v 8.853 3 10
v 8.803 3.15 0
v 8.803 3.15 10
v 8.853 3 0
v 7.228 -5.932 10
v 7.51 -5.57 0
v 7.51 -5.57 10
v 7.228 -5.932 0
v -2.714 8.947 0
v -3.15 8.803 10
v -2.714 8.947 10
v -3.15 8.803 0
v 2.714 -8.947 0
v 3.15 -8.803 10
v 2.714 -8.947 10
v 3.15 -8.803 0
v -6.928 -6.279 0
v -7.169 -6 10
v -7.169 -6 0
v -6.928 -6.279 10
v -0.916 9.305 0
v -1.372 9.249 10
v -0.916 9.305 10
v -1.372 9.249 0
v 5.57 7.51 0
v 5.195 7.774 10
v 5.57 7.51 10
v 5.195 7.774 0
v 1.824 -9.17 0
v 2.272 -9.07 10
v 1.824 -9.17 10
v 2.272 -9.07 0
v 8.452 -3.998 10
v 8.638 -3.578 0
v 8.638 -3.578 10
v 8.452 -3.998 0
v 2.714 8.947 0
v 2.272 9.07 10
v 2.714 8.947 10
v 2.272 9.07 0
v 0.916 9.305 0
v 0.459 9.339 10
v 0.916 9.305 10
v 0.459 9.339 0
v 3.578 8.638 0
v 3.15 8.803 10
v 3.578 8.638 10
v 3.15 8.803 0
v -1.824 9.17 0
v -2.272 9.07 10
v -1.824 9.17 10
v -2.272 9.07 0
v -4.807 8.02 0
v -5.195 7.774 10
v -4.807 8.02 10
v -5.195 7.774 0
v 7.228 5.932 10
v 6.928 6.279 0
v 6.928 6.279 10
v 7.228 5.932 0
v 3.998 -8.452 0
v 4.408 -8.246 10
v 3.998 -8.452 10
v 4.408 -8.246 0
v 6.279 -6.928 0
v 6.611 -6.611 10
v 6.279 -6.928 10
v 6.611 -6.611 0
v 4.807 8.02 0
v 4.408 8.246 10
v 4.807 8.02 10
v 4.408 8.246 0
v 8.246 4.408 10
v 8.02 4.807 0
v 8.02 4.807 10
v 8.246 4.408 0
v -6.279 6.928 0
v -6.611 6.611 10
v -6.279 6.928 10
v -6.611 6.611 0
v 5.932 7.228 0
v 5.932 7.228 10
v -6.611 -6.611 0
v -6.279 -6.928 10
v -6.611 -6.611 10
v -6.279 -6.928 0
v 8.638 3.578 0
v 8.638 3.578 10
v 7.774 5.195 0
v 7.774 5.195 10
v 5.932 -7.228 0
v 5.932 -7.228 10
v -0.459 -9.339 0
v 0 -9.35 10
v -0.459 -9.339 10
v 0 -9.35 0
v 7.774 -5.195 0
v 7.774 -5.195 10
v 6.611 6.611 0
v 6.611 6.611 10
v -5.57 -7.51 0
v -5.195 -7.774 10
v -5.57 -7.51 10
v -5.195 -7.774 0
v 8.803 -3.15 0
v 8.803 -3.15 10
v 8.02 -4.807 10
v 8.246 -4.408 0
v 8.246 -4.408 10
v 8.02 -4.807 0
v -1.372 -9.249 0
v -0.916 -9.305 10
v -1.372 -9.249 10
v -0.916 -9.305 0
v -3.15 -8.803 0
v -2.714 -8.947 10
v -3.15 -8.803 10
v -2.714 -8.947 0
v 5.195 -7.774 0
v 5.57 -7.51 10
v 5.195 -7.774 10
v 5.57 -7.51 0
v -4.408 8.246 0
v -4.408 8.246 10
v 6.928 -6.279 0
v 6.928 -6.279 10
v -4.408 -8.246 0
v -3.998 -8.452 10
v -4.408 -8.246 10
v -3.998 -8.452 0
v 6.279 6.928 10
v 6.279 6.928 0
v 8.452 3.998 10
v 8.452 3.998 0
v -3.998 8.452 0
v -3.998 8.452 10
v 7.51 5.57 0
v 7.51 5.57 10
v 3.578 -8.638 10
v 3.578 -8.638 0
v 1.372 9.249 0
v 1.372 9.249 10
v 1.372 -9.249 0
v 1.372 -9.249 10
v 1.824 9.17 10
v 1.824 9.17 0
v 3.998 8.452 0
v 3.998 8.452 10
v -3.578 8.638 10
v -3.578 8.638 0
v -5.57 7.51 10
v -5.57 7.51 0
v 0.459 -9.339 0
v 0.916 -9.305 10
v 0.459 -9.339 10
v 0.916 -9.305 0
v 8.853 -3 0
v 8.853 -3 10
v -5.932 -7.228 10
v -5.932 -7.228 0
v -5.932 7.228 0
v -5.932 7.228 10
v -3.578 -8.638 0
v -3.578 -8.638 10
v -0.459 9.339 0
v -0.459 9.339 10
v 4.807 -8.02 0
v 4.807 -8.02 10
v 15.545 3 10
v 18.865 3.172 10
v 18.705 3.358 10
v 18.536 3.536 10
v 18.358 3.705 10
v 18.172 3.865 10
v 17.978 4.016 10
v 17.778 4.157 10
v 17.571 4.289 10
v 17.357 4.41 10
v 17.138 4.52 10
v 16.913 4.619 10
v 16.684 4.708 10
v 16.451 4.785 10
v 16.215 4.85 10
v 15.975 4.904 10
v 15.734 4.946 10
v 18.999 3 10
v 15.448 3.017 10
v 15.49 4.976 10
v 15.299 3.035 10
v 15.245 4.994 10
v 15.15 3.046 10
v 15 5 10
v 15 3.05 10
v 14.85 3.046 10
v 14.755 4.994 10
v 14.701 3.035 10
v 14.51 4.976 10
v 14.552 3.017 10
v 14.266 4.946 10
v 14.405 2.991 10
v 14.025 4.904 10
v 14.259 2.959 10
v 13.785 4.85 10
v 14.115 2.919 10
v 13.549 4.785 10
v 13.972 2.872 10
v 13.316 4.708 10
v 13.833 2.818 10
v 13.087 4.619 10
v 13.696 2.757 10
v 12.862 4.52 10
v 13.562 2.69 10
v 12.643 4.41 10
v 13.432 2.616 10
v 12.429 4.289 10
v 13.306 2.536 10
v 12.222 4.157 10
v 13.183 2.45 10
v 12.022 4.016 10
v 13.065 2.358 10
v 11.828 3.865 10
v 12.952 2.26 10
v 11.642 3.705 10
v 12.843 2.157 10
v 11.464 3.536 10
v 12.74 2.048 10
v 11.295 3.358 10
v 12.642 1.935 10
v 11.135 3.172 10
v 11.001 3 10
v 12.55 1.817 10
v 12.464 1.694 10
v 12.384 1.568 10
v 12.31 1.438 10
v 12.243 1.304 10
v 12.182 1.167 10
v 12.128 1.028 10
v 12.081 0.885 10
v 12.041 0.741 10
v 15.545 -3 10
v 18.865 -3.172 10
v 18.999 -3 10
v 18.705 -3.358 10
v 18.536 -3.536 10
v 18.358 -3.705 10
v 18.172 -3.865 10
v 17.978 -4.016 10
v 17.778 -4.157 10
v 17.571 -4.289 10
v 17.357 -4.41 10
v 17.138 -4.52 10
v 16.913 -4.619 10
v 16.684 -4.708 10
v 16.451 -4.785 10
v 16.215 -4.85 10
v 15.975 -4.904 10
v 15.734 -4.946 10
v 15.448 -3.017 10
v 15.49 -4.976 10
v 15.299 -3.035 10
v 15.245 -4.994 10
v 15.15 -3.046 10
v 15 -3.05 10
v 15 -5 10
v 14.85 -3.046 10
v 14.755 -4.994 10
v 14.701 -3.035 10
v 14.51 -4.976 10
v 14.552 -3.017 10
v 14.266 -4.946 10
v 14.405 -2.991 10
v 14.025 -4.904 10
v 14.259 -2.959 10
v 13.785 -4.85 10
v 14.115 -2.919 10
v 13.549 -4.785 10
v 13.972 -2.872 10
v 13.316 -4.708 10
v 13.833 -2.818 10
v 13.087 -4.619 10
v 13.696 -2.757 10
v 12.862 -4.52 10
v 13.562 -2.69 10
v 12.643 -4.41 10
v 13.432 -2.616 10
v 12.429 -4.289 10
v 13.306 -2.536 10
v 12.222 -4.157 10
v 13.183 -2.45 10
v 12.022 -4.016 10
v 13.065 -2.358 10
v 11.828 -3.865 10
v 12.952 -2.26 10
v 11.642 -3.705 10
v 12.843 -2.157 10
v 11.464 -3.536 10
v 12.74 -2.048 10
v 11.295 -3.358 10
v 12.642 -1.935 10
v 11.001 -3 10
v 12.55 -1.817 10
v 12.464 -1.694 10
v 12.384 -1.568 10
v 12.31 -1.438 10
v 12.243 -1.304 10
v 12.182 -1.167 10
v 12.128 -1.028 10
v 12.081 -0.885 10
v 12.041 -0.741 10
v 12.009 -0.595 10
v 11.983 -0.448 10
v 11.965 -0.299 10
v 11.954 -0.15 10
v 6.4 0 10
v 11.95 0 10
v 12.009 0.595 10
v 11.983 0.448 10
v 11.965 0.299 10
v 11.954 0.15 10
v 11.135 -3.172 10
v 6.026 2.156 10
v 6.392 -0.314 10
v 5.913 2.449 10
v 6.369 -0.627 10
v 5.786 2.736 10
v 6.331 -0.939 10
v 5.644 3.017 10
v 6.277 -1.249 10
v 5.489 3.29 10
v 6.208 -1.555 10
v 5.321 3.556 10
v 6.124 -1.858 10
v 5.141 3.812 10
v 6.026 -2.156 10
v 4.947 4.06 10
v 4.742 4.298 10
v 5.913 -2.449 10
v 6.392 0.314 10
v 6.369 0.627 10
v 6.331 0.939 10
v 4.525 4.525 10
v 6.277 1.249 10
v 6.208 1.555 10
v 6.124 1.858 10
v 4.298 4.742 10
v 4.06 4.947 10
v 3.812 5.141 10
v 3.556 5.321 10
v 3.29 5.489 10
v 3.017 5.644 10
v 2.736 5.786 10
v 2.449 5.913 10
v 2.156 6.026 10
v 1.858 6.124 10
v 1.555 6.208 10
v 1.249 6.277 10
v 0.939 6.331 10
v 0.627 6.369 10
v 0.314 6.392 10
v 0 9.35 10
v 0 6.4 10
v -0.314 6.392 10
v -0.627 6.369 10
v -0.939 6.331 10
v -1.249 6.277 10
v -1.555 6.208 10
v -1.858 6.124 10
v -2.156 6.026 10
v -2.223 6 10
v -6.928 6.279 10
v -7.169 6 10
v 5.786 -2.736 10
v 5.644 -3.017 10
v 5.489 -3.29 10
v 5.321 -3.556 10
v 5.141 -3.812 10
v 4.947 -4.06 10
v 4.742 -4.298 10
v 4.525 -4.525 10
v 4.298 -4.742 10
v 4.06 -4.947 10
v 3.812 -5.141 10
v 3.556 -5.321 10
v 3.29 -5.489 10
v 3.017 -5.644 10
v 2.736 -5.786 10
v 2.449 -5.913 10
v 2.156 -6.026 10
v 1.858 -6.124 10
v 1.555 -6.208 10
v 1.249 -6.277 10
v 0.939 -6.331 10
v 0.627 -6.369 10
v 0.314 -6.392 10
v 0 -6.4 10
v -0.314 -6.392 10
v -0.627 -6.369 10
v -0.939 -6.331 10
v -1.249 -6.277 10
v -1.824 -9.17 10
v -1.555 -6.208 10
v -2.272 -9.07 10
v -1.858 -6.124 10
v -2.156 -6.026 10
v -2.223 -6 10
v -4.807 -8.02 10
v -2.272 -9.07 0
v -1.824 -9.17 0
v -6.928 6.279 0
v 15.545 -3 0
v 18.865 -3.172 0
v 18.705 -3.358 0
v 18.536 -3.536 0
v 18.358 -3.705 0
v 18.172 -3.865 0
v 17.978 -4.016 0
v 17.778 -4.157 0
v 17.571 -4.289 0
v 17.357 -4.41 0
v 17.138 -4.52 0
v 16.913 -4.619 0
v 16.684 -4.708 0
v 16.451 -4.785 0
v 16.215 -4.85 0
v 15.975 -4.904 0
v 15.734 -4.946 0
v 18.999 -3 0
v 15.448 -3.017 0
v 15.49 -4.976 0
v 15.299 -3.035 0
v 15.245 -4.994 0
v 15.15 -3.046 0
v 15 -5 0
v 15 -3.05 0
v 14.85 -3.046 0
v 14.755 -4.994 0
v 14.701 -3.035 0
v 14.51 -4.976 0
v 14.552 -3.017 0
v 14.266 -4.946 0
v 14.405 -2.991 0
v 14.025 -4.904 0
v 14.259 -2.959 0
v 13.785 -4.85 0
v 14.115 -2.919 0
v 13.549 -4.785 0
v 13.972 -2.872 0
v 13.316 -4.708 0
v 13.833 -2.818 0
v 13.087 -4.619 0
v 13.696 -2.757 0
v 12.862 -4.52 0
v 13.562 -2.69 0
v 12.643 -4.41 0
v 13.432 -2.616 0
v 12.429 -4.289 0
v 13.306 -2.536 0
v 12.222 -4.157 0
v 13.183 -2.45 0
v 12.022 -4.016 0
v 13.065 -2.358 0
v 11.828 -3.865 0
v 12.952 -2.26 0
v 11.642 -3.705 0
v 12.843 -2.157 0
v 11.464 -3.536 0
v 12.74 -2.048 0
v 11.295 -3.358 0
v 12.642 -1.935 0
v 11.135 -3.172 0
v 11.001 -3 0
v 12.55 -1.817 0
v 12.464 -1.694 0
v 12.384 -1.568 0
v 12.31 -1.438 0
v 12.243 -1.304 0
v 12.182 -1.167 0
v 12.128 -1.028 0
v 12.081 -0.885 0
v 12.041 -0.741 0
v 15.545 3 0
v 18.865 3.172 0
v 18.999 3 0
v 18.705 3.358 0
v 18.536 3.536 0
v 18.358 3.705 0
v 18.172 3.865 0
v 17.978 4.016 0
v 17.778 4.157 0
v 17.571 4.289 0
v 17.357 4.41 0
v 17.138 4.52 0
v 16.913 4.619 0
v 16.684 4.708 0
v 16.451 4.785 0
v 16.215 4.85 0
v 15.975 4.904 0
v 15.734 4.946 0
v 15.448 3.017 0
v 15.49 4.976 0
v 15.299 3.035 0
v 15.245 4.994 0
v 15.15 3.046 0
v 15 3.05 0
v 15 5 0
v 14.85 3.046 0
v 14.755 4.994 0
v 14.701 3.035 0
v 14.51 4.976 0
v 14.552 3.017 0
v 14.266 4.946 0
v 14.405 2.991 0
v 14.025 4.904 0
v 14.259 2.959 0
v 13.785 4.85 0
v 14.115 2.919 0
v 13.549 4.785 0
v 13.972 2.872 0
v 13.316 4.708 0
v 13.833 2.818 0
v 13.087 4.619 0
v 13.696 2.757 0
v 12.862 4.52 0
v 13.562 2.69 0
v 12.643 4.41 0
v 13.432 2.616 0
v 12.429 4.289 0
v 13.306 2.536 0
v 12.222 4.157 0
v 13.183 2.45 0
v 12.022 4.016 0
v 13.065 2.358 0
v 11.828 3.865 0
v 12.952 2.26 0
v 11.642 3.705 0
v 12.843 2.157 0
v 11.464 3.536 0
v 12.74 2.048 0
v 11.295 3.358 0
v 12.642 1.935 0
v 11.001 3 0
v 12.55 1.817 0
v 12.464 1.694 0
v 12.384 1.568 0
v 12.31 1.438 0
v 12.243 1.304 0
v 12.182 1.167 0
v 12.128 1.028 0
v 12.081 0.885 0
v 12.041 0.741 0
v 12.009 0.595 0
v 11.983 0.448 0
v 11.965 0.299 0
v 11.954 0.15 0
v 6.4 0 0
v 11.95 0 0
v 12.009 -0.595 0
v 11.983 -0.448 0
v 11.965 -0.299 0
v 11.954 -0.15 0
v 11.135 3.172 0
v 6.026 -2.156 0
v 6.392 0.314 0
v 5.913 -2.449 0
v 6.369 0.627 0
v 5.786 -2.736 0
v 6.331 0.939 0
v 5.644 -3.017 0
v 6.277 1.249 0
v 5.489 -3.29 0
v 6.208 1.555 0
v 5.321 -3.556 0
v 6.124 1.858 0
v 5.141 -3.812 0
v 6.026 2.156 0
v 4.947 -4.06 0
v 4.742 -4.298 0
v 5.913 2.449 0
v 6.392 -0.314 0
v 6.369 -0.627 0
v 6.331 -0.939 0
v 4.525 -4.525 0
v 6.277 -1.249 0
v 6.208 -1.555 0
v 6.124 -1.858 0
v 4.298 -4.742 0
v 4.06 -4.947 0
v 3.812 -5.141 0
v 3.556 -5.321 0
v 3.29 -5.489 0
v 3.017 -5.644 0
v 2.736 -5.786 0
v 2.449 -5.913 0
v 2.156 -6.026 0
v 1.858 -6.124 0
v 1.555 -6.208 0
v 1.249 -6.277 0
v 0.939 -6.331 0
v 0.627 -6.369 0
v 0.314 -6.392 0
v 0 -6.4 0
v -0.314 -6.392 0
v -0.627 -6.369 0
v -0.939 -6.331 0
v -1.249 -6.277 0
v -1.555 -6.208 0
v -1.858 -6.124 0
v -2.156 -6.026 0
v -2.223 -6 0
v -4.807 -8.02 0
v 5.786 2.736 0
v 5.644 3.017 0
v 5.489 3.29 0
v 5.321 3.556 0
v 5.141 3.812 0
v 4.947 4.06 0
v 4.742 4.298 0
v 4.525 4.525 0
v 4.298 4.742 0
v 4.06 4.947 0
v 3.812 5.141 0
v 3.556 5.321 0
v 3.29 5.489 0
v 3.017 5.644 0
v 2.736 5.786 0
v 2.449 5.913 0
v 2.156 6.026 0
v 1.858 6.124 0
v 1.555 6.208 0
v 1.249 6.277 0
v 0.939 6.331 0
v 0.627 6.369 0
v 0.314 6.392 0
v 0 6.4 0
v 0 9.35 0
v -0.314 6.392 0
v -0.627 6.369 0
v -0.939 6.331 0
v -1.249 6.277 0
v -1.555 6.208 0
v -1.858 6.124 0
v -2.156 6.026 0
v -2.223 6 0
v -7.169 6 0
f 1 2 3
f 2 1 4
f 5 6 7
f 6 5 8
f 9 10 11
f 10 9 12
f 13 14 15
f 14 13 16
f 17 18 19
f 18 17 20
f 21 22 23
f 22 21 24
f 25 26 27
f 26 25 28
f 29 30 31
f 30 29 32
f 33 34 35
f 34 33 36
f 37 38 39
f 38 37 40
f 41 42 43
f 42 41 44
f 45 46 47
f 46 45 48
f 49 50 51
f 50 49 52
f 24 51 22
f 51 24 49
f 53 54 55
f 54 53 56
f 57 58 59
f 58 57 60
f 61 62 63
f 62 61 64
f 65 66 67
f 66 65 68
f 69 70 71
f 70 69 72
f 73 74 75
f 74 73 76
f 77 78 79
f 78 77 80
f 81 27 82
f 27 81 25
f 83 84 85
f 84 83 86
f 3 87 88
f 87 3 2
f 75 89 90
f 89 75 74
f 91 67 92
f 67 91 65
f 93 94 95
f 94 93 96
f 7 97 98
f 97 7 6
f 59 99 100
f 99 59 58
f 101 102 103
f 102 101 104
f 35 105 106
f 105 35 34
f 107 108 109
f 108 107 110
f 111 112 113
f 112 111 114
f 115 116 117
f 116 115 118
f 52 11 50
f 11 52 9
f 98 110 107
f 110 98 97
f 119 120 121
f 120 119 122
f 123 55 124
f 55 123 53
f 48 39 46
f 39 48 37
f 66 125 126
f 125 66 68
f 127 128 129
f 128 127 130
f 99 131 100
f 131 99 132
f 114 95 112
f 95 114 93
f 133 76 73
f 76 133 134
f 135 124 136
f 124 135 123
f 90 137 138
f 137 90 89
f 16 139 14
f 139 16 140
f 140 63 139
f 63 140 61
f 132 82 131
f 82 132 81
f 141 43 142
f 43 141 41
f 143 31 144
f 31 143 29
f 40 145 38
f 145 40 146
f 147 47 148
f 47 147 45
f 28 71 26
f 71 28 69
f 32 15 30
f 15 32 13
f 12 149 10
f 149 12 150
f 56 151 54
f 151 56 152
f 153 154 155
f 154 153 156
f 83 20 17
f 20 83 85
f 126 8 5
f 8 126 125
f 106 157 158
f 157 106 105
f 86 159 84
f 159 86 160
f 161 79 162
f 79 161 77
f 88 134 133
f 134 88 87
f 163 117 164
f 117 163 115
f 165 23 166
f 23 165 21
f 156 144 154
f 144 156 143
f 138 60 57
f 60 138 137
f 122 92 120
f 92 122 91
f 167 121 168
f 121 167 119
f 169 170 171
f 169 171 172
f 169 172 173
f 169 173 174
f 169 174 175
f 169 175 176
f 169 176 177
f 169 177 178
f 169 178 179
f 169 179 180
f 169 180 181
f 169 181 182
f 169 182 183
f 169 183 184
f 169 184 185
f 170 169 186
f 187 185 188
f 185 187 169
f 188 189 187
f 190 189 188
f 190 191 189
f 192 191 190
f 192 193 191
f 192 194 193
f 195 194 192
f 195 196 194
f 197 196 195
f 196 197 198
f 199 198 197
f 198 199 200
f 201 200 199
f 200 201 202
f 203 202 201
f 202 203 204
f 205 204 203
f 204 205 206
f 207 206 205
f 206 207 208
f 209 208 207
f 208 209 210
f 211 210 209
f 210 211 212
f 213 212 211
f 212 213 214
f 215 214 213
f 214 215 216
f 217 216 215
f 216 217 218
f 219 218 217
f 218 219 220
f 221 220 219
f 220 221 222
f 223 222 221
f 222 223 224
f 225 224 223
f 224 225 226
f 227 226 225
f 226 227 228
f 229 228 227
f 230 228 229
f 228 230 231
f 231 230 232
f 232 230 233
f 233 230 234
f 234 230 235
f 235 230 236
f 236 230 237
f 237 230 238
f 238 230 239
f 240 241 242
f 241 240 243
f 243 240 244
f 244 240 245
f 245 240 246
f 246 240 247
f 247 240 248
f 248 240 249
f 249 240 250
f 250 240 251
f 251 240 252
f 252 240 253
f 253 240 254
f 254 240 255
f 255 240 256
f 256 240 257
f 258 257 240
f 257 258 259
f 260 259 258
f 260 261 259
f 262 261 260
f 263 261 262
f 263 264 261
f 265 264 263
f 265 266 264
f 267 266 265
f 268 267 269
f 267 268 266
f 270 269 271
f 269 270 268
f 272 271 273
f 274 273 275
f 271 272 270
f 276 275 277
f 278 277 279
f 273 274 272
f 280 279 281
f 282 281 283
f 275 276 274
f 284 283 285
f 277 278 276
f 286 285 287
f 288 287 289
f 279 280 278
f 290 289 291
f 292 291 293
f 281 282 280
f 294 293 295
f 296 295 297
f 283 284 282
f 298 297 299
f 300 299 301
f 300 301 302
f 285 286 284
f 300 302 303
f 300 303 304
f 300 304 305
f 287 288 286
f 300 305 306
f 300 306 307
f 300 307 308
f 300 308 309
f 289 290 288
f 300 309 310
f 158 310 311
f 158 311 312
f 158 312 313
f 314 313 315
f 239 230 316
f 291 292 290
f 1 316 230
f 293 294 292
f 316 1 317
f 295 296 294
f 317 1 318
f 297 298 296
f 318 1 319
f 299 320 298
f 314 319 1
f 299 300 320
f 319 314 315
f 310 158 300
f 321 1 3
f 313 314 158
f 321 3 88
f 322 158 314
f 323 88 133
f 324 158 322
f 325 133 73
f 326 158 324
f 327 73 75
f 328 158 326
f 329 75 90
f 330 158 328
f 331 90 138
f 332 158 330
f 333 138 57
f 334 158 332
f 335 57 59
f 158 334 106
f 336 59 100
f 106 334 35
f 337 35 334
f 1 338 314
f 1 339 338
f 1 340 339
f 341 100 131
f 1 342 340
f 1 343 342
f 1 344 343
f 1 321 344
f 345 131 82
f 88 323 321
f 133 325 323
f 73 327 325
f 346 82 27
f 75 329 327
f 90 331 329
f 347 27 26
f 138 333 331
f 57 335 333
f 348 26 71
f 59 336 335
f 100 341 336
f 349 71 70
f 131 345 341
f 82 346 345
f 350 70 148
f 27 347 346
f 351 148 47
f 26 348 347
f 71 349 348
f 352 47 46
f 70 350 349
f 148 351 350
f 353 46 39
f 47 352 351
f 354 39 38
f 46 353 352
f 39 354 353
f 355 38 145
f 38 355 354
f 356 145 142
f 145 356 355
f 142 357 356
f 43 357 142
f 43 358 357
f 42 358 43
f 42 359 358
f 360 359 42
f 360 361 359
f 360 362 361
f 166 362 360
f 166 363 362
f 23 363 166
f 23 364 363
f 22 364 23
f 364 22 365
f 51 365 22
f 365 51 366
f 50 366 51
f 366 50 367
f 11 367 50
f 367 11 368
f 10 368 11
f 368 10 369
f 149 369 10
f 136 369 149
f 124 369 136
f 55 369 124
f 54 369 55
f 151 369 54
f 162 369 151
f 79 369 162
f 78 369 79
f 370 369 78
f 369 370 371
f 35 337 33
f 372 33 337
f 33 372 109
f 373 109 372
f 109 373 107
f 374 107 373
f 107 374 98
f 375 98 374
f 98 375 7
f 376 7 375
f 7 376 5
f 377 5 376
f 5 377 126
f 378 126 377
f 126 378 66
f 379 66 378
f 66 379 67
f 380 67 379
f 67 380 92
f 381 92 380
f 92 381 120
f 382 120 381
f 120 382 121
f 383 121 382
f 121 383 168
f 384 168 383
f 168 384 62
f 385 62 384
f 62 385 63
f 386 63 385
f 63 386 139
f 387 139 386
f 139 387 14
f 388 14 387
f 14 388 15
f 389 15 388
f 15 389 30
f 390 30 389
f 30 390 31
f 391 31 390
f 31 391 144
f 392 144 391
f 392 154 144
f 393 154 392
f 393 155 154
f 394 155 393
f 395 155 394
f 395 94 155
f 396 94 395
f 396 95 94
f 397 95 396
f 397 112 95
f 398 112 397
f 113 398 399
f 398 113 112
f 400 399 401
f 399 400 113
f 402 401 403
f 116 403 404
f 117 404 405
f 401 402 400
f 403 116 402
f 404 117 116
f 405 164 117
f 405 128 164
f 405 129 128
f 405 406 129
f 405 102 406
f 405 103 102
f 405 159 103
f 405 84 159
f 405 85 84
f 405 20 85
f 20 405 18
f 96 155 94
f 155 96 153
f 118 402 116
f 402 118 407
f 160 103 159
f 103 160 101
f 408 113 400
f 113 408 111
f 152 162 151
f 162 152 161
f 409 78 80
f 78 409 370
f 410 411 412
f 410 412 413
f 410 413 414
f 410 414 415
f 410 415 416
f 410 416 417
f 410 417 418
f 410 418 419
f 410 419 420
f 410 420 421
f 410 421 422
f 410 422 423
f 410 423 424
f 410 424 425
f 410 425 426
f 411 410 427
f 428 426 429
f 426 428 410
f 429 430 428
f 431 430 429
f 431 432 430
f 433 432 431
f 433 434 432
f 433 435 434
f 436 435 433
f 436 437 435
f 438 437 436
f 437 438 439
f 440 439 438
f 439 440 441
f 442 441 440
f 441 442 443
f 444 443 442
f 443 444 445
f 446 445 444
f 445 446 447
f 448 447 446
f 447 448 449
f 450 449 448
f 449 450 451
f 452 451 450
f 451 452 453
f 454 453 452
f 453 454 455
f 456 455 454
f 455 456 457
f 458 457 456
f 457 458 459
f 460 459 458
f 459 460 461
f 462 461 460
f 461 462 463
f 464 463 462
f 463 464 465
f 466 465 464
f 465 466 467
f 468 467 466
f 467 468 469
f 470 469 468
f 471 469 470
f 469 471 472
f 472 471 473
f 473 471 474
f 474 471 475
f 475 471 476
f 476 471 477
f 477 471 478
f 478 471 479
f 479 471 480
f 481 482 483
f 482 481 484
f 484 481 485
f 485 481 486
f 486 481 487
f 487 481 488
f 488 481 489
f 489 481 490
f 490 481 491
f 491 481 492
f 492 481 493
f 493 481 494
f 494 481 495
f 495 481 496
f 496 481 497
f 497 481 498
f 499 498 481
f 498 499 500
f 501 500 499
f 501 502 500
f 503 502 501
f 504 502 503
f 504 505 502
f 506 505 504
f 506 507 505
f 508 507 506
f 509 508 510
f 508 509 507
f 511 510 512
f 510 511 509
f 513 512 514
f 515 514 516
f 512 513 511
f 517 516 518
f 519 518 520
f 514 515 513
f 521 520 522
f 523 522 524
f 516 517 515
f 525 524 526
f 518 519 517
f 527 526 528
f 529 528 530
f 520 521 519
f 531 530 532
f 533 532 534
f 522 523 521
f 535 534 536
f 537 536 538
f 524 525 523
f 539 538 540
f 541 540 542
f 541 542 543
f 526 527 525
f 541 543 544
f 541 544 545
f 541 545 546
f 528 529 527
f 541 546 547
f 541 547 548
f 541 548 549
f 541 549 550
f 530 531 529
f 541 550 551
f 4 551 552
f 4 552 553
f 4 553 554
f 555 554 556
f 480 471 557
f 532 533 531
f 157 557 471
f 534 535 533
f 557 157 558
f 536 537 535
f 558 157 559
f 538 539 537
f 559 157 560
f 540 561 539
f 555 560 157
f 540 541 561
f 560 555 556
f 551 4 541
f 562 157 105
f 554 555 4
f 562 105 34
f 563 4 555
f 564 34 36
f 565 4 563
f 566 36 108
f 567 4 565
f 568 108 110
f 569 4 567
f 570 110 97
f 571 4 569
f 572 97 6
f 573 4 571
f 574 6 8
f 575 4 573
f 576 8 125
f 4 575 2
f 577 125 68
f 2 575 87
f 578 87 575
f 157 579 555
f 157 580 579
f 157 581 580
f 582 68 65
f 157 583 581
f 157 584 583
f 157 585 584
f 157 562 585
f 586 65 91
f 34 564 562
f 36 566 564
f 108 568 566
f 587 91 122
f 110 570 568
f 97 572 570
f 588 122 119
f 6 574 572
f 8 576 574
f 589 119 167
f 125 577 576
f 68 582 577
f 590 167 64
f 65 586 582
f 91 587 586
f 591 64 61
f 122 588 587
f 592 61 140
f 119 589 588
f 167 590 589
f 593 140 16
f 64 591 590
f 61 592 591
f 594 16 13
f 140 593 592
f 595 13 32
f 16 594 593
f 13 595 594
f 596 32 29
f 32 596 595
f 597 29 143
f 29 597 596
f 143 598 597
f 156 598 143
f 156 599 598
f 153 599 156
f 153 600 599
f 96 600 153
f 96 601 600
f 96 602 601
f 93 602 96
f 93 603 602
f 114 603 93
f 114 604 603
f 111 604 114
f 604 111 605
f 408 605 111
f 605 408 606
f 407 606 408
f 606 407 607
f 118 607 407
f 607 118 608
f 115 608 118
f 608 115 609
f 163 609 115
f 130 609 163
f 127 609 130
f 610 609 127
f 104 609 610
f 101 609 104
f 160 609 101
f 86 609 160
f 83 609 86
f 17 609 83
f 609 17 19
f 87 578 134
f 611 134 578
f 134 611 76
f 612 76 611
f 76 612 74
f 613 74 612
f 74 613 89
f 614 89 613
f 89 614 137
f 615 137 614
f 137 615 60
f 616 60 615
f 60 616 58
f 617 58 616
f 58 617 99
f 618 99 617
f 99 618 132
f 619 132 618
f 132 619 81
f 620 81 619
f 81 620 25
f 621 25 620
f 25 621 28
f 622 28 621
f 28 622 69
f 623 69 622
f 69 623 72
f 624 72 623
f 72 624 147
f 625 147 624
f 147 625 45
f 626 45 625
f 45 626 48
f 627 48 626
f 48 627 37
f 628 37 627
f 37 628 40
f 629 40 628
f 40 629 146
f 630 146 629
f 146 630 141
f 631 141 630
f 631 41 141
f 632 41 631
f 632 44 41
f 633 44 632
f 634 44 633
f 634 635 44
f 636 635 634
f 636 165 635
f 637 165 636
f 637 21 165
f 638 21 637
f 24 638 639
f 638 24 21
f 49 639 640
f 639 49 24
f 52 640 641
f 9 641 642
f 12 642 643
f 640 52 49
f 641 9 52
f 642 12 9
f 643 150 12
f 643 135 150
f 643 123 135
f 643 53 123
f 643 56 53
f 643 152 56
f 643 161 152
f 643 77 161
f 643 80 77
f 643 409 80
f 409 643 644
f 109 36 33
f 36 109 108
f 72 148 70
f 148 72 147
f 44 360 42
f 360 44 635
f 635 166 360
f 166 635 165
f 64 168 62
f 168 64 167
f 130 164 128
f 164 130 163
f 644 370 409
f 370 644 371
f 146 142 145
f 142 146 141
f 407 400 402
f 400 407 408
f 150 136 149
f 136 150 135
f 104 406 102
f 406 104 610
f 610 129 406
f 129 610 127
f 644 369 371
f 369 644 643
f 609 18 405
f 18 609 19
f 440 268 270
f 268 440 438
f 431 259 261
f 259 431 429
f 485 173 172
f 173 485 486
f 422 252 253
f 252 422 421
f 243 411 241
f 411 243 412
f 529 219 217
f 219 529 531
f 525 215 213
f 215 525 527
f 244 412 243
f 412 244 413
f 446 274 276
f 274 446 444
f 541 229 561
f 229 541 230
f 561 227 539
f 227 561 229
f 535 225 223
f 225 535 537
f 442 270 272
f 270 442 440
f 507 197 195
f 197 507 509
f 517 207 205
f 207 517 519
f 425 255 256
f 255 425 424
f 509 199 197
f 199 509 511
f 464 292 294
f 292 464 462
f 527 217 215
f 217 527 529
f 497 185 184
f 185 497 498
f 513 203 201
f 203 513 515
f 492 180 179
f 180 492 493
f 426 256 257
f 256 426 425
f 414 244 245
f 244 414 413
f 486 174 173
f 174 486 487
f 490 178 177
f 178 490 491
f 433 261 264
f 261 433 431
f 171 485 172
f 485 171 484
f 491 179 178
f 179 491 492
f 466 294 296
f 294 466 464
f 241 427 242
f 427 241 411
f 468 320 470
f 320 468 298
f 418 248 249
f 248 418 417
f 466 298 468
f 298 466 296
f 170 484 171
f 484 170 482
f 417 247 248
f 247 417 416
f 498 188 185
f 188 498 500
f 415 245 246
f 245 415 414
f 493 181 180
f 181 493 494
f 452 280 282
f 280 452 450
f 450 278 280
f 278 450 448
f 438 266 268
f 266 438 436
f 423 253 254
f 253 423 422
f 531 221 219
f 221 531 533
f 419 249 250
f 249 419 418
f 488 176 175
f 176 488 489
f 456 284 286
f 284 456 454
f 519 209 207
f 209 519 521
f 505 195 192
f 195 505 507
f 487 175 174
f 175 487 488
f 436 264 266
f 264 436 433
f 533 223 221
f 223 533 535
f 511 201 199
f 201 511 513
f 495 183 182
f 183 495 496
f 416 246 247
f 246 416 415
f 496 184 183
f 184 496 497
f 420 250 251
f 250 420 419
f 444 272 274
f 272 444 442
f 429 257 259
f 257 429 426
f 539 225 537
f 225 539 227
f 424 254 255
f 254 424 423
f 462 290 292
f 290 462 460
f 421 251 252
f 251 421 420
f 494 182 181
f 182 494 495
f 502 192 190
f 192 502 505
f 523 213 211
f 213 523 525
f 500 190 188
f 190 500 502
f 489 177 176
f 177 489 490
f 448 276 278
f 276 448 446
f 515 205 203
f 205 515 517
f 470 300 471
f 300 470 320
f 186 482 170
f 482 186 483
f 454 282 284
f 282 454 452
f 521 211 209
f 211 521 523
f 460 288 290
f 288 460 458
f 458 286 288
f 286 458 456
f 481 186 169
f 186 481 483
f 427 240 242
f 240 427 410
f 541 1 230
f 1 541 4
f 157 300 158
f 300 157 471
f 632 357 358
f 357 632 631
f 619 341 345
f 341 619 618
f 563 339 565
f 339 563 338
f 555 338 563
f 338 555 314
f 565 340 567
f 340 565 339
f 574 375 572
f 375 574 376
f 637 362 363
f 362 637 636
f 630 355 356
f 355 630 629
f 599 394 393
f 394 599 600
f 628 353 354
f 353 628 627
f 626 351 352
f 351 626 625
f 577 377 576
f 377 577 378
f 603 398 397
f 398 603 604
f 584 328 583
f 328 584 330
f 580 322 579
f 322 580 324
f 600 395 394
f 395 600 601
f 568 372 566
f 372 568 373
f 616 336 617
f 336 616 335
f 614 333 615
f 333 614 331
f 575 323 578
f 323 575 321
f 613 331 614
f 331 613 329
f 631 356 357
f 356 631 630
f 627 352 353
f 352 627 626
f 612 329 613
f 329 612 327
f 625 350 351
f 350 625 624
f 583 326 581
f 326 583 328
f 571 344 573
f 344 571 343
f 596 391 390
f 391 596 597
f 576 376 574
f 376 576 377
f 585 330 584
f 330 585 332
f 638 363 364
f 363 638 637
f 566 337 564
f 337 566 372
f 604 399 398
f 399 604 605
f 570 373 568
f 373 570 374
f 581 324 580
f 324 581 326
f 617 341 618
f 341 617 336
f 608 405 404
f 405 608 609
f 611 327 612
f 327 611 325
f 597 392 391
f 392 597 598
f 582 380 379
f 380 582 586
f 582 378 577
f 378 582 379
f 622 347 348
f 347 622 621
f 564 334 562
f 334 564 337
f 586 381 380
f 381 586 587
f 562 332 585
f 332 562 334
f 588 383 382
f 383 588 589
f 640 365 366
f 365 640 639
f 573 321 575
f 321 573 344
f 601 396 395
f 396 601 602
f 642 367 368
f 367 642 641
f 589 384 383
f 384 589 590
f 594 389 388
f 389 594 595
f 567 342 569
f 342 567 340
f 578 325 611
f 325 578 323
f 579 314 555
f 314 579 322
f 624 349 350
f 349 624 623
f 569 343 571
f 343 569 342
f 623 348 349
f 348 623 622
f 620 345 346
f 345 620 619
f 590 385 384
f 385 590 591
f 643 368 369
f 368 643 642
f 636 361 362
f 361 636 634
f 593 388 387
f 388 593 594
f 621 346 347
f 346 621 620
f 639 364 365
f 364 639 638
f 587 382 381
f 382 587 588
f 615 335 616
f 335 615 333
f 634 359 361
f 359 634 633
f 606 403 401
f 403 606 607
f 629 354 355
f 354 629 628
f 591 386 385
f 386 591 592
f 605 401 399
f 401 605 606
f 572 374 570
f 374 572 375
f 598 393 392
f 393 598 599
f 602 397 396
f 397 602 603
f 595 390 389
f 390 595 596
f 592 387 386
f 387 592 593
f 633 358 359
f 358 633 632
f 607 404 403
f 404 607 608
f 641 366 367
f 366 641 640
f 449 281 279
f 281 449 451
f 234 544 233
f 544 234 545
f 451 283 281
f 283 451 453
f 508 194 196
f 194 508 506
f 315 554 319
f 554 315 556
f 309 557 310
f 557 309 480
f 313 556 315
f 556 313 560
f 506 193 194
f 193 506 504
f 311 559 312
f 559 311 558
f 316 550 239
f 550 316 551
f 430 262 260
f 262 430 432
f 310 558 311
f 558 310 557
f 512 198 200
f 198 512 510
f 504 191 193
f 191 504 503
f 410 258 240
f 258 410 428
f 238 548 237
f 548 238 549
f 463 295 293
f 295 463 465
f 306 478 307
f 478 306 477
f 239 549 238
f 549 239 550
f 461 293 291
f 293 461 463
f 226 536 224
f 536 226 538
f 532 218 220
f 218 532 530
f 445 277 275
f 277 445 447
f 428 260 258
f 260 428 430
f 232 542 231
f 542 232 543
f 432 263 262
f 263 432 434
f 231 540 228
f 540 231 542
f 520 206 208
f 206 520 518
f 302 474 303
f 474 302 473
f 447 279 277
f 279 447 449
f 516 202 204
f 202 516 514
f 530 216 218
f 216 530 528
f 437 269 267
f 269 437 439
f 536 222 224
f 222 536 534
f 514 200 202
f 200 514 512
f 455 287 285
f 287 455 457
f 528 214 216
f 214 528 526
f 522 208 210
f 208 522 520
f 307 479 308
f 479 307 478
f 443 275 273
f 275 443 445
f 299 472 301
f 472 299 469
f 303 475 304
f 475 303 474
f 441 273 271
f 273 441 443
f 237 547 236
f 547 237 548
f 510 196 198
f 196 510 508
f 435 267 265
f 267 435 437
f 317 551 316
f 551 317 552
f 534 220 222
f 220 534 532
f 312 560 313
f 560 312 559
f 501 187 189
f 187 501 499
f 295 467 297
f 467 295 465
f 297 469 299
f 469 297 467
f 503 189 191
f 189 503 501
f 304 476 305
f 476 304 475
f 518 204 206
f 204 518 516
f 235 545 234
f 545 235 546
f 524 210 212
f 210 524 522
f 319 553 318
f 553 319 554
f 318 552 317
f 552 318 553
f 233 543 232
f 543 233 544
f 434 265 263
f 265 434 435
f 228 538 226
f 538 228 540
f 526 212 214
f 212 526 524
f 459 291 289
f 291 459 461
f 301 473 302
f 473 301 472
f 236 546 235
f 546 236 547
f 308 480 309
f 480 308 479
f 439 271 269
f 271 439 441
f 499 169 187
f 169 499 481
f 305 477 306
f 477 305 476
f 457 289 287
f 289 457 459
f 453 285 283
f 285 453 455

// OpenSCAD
// Snap-on Clip for Lab Stand Rod and Tubing
// Orientation: Flat on XY plane, building upward (+Z)
// Units: Millimetres

// --- Dimensions ---
// Rod Ring
$rod_inner_d = 12.7;   // Inner diameter for 1/2" rod
$rod_wall = 3;         // Wall thickness
$rod_outer_d = $rod_inner_d + 2 * $rod_wall; // 18.7 mm
$rod_height = 10;      // Extrusion height (Z)
$rod_cut_width = 10;   // Width of opening on -X side

// Tubing Ring
$tube_inner_d = 6;     // Inner diameter
$tube_wall = 2;        // Wall thickness
$tube_outer_d = $tube_inner_d + 2 * $tube_wall; // 10 mm
$tube_x_pos = 15;      // Center X position
$tube_cut_width = 4.5; // Width of opening on +X side

// Bridge
$bridge_width_x = 4;   // Width in X (from 8 to 12)
$bridge_height_y = 6;  // Height in Y
$bridge_z = $rod_height; // Same height as extrusion

// --- Configuration ---
$fn = 128;             // High resolution for smooth curves

// --- Main Body Construction ---
// We build the solid profile first, then subtract the holes and cutouts.
// This ensures a single watertight body.

difference() {
    union() {
        // 1. Rod Ring (Outer Shell)
        // Centered at (0,0). Outer diameter 18.7.
        // Cutout on -X side: x < 0 and -5 < y < 5.
        // The cutout width is 10mm. Since the ring is symmetric, the cutout spans from x=-5 to x=5?
        // Wait, spec says: "x < 0 and -5 < y < 5 is removed".
        // This implies the cutout is a rectangle defined by x < 0, y > -5, y < 5.
        // However, to make a "snap on" clip, the cutout must be a hole through the material.
        // If the ring is 18.7mm OD, the material exists from radius 9.35 to 12.7.
        // A cutout of width 10mm on the -X side likely means removing material from x = -9.35 to x = 0.75?
        // Or simply removing the rectangle defined by the spec.
        // Let's interpret "10 mm wide opening" as the dimension of the gap.
        // If the gap is 10mm wide and centered on the Y-axis? No, it's on the -X side.
        // Let's assume the gap is from x = -10 to x = 0? Or x = -5 to x = 5?
        // "x < 0 and -5 < y < 5 is removed". This defines a semi-infinite region in X.
        // But we are cutting a ring. The ring material is only where radius > 9.35.
        // So the cutout is the intersection of the ring and the region (x<0, -5<y<5).
        // This creates a gap on the left side.
        
        translate([0, 0, 0]) {
            // Outer Cylinder
            cylinder(h = $rod_height, d = $rod_outer_d, center = [0, 0, $rod_height/2]);
            
            // Inner Hole (Rod passes through)
            cylinder(h = $rod_height, d = $rod_inner_d, center = [0, 0, $rod_height/2]);
            
            // Cutout Logic:
            // We need to subtract the volume where (x < 0) AND (-5 < y < 5).
            // Since we are in a difference(), we add a cutting shape.
            // The cutting shape must cover the entire height and the specific X/Y region.
            // To ensure it cuts through the ring, it must extend beyond the ring's outer diameter in X and Y.
            // X range: -infinity to 0. We'll use -20 to 0.
            // Y range: -5 to 5. We'll use -6 to 6.
            // Z range: 0 to 10.
            translate([-20, -6, 0]) {
                cube([20, 12, $rod_height + 0.1]);
            }
        }
        
        // 2. Tubing Ring (Outer Shell)
        // Centered at (15, 0). Outer diameter 10.
        // Cutout on +X side: x > 15 and -2.25 < y < 2.25.
        translate([$tube_x_pos, 0, 0]) {
            // Outer Cylinder
            cylinder(h = $rod_height, d = $tube_outer_d, center = [0, 0, $rod_height/2]);
            
            // Inner Hole (Tubing passes through)
            cylinder(h = $rod_height, d = $tube_inner_d, center = [0, 0, $rod_height/2]);
            
            // Cutout Logic:
            // Region: x > 15, -2.25 < y < 2.25.
            // Translate to local coords: x > 0, -2.25 < y < 2.25.
            // Cutting shape: x from 0 to 20, y from -3 to 3.
            translate([0, -3, 0]) {
                cube([20, 6, $rod_height + 0.1]);
            }
        }
        
        // 3. Solid Bridge
        // Joins the two rings.
        // Spec: "6 mm wide (Y) between x = 8 and x = 12".
        // This implies the bridge spans X from 8 to 12 (width 4) and Y from -3 to 3 (width 6).
        // It must not block the holes.
        // Rod hole is at (0,0) with d=12.7. Bridge is at x=8..12. Safe.
        // Tube hole is at (15,0) with d=6. Bridge is at x=8..12. Safe.
        translate([8, -3, 0]) {
            cube([4, 6, $rod_height]);
        }
    }
    
    // --- Subtraction of Holes and Cutouts (Redundant but safe for clarity) ---
    // The logic above uses difference() inside the union, which is correct.
    // However, to ensure the "cutout" is exactly as described and clean:
    
    // Rod Cutout (Left side)
    // Defined by x < 0, -5 < y < 5.
    // We subtract a block that covers this area.
    translate([-20, -6, 0]) {
        cube([20, 12, $rod_height + 0.1]);
    }
    
    // Tube Cutout (Right side)
    // Defined by x > 15, -2.25 < y < 2.25.
    // In global coords: x > 15.
    translate([$tube_x_pos, -3, 0]) {
        cube([20, 6, $rod_height + 0.1]);
    }
    
    // Rod Inner Hole
    translate([0, 0, 0]) {
        cylinder(h = $rod_height + 0.1, d = $rod_inner_d + 0.1, center = [0, 0, $rod_height/2]);
    }
    
    // Tube Inner Hole
    translate([$tube_x_pos, 0, 0]) {
        cylinder(h = $rod_height + 0.1, d = $tube_inner_d + 0.1, center = [0, 0, $rod_height/2]);
    }
}
